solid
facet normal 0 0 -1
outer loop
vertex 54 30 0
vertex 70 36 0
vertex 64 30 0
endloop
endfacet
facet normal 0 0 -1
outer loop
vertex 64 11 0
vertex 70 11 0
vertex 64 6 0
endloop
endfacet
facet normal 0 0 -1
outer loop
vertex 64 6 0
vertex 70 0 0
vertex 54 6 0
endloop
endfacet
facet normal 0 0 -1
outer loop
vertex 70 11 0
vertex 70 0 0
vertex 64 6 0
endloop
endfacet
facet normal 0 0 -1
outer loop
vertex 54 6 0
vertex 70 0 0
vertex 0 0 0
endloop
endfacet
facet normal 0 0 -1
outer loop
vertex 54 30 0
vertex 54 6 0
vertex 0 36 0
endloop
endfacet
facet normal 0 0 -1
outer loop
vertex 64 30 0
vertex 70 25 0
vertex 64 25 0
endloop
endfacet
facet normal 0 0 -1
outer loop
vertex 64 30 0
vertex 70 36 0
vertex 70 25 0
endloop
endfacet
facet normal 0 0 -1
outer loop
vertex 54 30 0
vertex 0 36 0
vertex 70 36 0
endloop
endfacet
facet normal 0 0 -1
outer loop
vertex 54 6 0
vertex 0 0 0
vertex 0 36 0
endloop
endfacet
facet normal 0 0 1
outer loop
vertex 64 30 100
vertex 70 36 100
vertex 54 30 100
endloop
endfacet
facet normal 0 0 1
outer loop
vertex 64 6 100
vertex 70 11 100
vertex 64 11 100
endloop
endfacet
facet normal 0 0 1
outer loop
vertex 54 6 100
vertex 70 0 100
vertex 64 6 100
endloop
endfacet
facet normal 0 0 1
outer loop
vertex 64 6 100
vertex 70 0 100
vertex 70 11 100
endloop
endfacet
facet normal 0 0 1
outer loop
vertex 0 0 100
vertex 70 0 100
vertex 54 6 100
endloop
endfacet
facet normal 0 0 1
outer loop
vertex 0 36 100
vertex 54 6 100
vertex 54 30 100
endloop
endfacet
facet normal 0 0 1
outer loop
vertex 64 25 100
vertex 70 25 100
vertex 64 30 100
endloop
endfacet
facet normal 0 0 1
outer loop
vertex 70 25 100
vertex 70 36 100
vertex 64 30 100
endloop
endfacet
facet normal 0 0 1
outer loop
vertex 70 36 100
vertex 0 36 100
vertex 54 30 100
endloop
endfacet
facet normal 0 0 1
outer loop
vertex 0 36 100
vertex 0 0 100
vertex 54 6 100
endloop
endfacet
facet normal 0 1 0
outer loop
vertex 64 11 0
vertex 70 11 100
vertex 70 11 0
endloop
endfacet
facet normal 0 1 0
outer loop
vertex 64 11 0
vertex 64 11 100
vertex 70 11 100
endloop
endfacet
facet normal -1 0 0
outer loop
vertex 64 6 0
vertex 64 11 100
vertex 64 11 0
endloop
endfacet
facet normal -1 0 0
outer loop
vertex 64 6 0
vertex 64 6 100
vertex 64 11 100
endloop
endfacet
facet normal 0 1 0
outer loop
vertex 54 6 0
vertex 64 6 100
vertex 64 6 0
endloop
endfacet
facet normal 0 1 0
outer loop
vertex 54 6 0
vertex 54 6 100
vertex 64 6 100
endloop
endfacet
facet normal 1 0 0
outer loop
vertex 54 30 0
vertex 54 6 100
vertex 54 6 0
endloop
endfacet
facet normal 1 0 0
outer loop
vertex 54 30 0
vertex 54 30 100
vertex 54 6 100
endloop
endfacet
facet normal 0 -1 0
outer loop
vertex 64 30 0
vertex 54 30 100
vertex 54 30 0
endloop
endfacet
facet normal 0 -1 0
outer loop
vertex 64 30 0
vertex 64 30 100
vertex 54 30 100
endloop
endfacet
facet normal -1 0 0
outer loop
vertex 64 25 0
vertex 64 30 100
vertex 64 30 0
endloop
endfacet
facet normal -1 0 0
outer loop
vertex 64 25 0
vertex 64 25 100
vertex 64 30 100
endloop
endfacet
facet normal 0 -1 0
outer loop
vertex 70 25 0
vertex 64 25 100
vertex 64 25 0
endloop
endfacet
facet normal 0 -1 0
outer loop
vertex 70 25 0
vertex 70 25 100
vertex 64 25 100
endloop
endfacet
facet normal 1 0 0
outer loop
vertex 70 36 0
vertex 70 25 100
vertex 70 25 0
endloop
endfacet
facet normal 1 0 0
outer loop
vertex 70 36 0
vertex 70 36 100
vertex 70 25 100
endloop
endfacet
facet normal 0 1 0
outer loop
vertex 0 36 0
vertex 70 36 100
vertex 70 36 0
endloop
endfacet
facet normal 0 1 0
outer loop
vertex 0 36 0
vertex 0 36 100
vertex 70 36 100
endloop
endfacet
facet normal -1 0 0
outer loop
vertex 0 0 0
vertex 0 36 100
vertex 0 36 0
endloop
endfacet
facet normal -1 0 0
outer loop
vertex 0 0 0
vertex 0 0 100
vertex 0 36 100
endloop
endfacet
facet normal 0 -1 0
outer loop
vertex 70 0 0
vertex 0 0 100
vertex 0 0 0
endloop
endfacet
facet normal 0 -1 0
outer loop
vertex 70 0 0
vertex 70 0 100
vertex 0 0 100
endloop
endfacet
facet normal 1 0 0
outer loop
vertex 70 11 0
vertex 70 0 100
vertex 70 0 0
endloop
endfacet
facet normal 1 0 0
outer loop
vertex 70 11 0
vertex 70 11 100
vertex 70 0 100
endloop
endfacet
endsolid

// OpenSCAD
$fn = 32;

// ----------------------------------------------------------------------
// T-slot rail: 70 x 36 mm section, 100 mm long
// ----------------------------------------------------------------------

// --- parameters (mm) ---
profile_height = 100;     // extrusion height
profile_points = 12;      // points of the closed outline

profile = [[0, 0], [70, 0], [70, 11], [64, 11], [64, 6], [54, 6], [54, 30], [64, 30], [64, 25], [70, 25], [70, 36], [0, 36]];  // single closed polygon, 12 points, counter clockwise

// --- the one profile operation ---
linear_extrude(height = profile_height) polygon(points = profile);
